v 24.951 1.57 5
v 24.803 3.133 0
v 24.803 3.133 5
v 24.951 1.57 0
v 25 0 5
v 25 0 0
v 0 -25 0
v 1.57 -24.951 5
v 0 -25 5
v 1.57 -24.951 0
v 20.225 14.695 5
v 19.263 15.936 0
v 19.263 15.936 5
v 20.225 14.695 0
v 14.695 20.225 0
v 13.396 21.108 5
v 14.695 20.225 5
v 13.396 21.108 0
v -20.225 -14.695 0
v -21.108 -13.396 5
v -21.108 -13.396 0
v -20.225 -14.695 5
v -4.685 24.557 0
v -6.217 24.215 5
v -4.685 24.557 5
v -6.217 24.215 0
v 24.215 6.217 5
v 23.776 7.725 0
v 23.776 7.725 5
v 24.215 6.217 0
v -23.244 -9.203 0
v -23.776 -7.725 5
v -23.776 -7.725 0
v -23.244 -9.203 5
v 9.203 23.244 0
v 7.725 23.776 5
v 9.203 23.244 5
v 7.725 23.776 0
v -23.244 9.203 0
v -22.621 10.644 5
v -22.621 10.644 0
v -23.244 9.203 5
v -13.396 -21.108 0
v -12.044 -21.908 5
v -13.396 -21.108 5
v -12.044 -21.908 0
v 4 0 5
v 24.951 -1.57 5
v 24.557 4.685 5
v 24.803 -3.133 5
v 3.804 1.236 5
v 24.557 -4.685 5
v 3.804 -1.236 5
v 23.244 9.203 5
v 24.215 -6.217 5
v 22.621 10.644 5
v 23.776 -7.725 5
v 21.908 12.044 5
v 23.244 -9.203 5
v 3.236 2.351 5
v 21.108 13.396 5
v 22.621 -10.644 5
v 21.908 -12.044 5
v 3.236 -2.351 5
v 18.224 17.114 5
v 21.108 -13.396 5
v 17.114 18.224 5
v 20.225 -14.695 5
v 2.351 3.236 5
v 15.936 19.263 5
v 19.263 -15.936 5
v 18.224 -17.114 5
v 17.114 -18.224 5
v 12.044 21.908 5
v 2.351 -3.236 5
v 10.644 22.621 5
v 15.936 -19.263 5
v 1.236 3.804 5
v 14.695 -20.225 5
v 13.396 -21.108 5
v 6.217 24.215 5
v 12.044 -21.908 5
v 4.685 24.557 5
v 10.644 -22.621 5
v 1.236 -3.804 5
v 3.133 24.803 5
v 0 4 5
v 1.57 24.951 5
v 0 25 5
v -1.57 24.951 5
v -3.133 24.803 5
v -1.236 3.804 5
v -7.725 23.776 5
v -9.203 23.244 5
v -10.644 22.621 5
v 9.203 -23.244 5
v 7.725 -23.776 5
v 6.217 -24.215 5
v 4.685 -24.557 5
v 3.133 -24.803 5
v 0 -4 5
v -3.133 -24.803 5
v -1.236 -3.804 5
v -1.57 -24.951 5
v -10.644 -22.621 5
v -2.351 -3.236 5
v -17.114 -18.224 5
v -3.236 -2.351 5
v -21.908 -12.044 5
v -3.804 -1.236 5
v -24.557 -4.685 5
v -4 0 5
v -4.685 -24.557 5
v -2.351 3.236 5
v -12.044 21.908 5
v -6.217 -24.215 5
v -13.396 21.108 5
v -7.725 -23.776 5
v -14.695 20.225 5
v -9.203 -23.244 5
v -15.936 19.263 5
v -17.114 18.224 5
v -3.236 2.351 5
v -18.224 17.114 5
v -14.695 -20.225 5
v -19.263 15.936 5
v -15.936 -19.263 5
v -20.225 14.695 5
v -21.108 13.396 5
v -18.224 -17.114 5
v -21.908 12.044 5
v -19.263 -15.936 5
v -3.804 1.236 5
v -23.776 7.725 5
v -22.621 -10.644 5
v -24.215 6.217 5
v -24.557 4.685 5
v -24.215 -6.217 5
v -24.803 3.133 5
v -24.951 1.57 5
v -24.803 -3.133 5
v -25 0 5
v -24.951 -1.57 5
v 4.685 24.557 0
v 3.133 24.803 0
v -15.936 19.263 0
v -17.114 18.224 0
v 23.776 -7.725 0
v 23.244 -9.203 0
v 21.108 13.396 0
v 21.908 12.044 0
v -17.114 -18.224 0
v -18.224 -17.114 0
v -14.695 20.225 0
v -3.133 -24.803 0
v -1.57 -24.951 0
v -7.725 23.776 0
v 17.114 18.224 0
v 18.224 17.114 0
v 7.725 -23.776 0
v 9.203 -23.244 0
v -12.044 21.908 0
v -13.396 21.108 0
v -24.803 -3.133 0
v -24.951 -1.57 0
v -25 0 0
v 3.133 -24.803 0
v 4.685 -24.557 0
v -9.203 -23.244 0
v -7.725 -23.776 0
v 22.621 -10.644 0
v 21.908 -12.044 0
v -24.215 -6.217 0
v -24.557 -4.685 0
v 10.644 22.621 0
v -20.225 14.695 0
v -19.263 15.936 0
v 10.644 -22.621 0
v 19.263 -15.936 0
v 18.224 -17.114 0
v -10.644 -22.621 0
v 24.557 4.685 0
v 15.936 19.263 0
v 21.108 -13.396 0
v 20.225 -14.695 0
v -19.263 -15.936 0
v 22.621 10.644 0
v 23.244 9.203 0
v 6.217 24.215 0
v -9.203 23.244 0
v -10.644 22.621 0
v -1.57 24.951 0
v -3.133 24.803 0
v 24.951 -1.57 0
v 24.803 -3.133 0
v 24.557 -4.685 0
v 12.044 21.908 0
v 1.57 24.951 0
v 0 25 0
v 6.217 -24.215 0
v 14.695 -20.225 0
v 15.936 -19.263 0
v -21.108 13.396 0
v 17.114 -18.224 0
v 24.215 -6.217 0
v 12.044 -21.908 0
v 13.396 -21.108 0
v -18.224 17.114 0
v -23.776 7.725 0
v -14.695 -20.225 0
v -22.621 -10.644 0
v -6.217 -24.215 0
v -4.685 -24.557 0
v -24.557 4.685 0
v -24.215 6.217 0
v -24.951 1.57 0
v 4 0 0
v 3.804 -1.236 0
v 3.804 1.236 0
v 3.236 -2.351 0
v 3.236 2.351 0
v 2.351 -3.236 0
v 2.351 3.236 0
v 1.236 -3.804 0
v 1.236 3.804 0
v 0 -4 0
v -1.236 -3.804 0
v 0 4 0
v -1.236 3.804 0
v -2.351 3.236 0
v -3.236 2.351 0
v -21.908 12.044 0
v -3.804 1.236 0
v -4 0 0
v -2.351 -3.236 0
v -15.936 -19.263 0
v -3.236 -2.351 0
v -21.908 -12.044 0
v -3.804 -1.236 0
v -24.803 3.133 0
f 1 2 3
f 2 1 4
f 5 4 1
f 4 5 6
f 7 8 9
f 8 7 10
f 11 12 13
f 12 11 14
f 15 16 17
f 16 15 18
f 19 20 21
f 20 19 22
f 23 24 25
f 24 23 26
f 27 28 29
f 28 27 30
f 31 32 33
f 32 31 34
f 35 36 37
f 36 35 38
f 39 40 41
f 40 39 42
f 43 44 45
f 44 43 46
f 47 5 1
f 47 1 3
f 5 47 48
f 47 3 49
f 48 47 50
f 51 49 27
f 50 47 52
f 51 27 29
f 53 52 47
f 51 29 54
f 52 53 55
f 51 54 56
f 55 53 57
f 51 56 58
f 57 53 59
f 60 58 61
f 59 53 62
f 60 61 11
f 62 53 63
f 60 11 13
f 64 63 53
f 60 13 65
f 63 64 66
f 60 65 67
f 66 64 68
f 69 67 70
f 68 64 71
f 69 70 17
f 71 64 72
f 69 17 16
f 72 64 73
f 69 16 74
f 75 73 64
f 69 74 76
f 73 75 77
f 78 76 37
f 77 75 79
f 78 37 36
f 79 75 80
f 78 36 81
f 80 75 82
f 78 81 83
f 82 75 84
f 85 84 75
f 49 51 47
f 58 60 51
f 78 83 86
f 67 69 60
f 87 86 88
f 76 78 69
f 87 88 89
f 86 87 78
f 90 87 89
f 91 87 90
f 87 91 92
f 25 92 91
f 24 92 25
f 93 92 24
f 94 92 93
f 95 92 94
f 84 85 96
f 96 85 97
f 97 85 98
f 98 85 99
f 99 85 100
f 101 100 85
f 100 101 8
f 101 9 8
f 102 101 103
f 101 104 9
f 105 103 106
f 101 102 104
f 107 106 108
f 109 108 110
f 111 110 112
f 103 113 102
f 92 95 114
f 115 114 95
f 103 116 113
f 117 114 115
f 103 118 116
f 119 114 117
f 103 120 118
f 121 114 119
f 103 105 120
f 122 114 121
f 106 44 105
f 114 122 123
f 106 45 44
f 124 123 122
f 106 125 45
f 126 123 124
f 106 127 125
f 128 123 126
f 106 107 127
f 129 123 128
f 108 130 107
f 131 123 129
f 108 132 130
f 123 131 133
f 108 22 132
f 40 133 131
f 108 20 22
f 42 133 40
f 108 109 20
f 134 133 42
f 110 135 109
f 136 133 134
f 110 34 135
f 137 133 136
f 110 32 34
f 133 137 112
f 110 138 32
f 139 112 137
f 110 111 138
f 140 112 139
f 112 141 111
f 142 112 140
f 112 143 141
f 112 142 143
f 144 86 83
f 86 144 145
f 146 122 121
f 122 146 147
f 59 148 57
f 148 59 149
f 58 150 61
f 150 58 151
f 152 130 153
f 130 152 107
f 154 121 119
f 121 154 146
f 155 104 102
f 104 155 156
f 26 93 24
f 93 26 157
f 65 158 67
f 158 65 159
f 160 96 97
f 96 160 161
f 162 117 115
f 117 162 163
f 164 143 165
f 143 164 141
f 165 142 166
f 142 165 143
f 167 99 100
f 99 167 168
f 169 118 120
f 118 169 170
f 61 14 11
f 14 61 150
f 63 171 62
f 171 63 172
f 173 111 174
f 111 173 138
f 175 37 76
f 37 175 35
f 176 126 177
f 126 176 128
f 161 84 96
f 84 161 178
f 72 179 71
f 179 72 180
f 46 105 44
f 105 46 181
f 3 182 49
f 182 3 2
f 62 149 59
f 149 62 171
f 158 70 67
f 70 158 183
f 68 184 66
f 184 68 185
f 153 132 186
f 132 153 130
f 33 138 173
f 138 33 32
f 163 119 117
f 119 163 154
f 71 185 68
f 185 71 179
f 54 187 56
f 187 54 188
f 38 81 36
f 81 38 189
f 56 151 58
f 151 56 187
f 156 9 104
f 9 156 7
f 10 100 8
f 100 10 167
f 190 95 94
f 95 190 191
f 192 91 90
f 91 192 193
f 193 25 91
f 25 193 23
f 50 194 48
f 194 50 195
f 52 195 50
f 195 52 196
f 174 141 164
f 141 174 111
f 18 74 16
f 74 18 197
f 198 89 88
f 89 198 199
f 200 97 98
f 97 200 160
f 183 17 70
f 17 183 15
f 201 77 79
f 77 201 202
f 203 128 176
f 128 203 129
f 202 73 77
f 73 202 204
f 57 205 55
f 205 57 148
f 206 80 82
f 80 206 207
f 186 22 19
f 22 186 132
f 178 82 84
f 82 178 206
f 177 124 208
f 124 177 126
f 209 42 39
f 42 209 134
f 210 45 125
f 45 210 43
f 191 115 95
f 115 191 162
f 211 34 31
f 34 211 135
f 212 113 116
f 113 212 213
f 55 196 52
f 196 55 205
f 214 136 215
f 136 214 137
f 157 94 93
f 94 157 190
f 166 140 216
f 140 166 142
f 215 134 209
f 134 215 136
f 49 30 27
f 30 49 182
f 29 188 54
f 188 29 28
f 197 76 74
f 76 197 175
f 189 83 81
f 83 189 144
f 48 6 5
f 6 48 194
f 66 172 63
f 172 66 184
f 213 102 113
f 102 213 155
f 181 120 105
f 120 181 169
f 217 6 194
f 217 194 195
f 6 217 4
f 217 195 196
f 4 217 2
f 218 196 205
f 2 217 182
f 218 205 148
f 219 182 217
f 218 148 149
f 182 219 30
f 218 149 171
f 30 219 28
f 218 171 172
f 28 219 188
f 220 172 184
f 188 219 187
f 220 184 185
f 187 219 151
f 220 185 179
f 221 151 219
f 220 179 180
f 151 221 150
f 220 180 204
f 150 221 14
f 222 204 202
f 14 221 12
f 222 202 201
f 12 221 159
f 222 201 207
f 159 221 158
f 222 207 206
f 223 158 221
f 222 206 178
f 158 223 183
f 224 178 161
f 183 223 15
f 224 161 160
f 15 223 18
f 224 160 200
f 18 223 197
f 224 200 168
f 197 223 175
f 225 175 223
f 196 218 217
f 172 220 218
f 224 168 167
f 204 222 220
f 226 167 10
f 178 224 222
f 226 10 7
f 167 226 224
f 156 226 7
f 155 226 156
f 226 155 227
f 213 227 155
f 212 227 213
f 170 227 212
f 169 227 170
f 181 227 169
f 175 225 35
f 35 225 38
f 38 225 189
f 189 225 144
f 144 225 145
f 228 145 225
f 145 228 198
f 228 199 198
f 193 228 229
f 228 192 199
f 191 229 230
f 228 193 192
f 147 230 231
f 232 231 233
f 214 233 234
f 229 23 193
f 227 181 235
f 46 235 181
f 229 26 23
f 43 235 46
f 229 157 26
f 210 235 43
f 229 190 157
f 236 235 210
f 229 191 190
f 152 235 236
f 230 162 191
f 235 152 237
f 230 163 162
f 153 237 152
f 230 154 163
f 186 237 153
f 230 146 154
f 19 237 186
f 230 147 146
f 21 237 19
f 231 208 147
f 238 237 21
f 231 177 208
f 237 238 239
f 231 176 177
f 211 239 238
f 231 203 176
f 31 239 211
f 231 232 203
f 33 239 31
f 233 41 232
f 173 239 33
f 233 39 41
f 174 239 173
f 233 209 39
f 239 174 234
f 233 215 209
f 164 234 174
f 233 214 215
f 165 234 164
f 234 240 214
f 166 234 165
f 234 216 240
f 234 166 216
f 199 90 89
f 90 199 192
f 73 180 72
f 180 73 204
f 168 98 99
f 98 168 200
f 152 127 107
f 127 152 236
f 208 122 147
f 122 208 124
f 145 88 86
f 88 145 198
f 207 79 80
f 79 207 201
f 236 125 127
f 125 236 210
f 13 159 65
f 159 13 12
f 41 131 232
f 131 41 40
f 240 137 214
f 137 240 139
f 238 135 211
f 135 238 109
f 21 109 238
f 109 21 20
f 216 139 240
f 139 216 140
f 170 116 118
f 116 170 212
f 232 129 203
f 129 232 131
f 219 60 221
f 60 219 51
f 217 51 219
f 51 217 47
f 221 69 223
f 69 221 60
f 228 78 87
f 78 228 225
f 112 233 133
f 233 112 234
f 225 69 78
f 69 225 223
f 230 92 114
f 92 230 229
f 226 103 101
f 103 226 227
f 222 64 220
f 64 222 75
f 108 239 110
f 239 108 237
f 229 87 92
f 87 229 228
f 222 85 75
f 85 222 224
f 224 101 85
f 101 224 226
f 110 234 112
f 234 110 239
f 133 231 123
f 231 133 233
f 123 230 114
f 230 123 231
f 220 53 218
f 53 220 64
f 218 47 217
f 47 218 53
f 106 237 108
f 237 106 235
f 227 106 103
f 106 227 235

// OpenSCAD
//Rueda simple
difference(){
//rueda original    
cylinder(r=50/2,h=5,$fn=100);
//taladro
cylinder(r=8/2,h=20,$fn=20,center=true);
}
